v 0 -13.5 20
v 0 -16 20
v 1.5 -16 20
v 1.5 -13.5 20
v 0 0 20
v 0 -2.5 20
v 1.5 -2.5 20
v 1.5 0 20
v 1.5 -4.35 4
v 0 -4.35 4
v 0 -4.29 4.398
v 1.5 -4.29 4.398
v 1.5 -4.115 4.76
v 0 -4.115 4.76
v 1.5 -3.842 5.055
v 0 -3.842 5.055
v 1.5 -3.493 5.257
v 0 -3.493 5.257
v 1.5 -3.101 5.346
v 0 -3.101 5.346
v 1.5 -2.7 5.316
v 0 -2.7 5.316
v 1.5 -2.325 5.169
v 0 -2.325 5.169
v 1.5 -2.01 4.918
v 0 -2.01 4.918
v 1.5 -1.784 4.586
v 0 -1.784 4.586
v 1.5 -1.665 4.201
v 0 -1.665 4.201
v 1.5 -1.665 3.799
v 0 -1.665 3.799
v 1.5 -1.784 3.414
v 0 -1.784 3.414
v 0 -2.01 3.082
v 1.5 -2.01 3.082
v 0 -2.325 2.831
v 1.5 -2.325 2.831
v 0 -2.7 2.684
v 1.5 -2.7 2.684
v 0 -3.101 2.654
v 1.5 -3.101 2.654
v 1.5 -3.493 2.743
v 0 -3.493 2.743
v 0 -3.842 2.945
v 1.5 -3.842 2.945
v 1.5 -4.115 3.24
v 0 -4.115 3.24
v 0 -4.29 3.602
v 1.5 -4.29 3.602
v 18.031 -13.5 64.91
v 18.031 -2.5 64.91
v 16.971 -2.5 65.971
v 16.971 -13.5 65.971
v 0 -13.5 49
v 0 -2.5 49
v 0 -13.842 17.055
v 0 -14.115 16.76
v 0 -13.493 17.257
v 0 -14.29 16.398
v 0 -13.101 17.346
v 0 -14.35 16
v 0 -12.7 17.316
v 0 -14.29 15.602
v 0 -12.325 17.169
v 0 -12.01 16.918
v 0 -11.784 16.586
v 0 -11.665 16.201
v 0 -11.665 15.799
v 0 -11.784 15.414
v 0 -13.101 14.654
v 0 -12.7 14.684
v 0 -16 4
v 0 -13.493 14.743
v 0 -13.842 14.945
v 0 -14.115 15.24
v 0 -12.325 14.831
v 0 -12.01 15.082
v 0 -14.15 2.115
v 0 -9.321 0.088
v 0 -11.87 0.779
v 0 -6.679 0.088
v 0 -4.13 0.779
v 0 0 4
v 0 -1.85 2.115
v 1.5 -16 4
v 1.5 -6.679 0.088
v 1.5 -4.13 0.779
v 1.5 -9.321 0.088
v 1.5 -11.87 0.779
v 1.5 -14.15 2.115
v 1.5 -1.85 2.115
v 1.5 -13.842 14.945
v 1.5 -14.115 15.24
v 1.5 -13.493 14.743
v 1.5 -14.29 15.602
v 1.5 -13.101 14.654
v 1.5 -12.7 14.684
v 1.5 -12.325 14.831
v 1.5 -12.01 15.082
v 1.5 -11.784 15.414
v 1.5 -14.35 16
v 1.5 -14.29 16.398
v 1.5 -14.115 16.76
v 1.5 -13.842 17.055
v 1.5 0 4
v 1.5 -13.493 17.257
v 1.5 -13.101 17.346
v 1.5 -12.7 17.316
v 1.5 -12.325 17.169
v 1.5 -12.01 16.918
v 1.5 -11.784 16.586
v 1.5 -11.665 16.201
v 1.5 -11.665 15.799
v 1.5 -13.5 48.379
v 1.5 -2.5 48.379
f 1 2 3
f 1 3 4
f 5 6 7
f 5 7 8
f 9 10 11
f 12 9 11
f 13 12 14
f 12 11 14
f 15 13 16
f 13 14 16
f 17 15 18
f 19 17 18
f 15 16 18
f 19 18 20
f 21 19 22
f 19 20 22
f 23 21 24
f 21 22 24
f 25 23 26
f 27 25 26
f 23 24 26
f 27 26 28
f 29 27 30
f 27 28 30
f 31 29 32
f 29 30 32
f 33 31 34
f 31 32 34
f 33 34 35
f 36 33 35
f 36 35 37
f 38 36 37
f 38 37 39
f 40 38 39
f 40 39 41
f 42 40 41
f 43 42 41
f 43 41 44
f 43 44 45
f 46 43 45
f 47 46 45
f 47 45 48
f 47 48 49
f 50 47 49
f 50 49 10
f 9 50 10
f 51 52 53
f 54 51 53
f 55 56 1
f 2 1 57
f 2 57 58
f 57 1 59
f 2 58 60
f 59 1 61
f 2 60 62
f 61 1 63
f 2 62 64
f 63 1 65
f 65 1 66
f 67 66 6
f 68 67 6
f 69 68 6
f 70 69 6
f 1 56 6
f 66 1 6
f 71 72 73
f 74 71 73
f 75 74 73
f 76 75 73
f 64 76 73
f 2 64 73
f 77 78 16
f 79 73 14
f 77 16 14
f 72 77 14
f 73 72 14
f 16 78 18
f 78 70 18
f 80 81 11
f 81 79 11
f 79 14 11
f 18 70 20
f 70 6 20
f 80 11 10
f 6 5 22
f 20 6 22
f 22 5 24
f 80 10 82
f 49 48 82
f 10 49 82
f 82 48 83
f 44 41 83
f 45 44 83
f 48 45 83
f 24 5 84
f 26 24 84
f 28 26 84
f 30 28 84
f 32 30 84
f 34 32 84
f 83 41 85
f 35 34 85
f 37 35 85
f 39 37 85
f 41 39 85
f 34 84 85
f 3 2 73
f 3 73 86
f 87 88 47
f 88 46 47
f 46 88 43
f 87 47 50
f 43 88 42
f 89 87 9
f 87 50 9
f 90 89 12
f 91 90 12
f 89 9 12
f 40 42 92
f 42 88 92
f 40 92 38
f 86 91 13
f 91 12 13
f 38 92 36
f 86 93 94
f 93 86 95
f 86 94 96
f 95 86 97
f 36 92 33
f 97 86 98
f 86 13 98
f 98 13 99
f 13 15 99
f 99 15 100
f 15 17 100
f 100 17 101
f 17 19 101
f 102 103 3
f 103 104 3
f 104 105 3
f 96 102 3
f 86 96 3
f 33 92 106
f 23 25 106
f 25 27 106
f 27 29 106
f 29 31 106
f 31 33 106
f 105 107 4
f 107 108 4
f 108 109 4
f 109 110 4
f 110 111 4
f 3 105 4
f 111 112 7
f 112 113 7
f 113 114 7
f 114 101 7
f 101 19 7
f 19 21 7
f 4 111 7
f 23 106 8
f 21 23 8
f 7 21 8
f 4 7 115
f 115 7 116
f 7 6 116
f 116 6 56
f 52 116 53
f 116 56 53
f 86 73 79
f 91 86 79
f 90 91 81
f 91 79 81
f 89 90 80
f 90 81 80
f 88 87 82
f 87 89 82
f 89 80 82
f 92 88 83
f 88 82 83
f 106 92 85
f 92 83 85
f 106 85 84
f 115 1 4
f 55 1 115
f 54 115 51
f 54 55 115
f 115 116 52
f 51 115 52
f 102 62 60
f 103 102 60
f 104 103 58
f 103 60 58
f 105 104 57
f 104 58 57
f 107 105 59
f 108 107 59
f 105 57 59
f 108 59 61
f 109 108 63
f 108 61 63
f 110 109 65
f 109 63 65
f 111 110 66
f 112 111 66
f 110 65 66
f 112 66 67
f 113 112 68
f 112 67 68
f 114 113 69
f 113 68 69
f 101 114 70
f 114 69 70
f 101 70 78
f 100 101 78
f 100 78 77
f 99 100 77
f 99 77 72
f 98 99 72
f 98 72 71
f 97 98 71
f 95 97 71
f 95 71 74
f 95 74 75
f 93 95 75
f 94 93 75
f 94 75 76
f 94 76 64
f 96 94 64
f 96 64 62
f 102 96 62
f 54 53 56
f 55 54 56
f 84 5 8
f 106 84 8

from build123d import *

# Parameters (mm, degrees)
F1_DEPTH = 16
F2_W     = 9.0714404329
F2_H     = 45.9705627485
F2_W_2   = 9.9285595671
F3_DEPTH = 25
F5_DEPTH = 18.0322229203
F6_R     = 1.35
F7_DEPTH = 18.0322229203
F8_DEPTH = 18.0322229203


with BuildPart() as f1:
    # F0 (on Front) → F1 (new body)
    with BuildSketch(Plane.XZ):
        Polygon((0, 49), (0, 0), (1.5, 0), (1.5, 48.3786796564), (18.0312229203, 64.9099025767), (16.9705627485, 65.9705627485), align=None)
    extrude(amount=F1_DEPTH)

    # F2 (on Right) → F3 (cut)
    with BuildSketch(Plane.YZ):
        with Locations((2.0357202164, 42.9852813742)):
            Rectangle(F2_W, F2_H)
        with Locations((-18.4642797836, 42.9852813742)):
            Rectangle(F2_W_2, F2_H)
    extrude(amount=F3_DEPTH, mode=Mode.SUBTRACT)

    # F4 (on face) → F5 (cut, through all)
    with BuildSketch(Plane(origin=(0, 0, 0), x_dir=(0, -1, 0), z_dir=(-1, 0, 0))):
        with BuildLine():
            ThreePointArc((18, 10), (8, 0), (-2, 10))
            Line((-2, 10), (-2, -2.5))
            Line((-2, -2.5), (18, -2.5))
            Line((18, -2.5), (18, 10))
        make_face()
    extrude(amount=-F5_DEPTH, mode=Mode.SUBTRACT)

    # F6 (on face) → F7 (cut, through all)
    with BuildSketch(Plane(origin=(0, 0, 0), x_dir=(0, -1, 0), z_dir=(-1, 0, 0))):
        with Locations((13, 16)):
            Circle(F6_R)
        with Locations((3, 4)):
            Circle(F6_R)
    extrude(amount=-F7_DEPTH, mode=Mode.SUBTRACT)

    # F6 (on face) → F8 (cut, through all)
    with BuildSketch(Plane(origin=(0, 0, 0), x_dir=(0, -1, 0), z_dir=(-1, 0, 0))):
        with Locations((13, 16)):
            Circle(F6_R)
        with Locations((3, 4)):
            Circle(F6_R)
    extrude(amount=-F8_DEPTH, mode=Mode.SUBTRACT)


solid = f1.part
